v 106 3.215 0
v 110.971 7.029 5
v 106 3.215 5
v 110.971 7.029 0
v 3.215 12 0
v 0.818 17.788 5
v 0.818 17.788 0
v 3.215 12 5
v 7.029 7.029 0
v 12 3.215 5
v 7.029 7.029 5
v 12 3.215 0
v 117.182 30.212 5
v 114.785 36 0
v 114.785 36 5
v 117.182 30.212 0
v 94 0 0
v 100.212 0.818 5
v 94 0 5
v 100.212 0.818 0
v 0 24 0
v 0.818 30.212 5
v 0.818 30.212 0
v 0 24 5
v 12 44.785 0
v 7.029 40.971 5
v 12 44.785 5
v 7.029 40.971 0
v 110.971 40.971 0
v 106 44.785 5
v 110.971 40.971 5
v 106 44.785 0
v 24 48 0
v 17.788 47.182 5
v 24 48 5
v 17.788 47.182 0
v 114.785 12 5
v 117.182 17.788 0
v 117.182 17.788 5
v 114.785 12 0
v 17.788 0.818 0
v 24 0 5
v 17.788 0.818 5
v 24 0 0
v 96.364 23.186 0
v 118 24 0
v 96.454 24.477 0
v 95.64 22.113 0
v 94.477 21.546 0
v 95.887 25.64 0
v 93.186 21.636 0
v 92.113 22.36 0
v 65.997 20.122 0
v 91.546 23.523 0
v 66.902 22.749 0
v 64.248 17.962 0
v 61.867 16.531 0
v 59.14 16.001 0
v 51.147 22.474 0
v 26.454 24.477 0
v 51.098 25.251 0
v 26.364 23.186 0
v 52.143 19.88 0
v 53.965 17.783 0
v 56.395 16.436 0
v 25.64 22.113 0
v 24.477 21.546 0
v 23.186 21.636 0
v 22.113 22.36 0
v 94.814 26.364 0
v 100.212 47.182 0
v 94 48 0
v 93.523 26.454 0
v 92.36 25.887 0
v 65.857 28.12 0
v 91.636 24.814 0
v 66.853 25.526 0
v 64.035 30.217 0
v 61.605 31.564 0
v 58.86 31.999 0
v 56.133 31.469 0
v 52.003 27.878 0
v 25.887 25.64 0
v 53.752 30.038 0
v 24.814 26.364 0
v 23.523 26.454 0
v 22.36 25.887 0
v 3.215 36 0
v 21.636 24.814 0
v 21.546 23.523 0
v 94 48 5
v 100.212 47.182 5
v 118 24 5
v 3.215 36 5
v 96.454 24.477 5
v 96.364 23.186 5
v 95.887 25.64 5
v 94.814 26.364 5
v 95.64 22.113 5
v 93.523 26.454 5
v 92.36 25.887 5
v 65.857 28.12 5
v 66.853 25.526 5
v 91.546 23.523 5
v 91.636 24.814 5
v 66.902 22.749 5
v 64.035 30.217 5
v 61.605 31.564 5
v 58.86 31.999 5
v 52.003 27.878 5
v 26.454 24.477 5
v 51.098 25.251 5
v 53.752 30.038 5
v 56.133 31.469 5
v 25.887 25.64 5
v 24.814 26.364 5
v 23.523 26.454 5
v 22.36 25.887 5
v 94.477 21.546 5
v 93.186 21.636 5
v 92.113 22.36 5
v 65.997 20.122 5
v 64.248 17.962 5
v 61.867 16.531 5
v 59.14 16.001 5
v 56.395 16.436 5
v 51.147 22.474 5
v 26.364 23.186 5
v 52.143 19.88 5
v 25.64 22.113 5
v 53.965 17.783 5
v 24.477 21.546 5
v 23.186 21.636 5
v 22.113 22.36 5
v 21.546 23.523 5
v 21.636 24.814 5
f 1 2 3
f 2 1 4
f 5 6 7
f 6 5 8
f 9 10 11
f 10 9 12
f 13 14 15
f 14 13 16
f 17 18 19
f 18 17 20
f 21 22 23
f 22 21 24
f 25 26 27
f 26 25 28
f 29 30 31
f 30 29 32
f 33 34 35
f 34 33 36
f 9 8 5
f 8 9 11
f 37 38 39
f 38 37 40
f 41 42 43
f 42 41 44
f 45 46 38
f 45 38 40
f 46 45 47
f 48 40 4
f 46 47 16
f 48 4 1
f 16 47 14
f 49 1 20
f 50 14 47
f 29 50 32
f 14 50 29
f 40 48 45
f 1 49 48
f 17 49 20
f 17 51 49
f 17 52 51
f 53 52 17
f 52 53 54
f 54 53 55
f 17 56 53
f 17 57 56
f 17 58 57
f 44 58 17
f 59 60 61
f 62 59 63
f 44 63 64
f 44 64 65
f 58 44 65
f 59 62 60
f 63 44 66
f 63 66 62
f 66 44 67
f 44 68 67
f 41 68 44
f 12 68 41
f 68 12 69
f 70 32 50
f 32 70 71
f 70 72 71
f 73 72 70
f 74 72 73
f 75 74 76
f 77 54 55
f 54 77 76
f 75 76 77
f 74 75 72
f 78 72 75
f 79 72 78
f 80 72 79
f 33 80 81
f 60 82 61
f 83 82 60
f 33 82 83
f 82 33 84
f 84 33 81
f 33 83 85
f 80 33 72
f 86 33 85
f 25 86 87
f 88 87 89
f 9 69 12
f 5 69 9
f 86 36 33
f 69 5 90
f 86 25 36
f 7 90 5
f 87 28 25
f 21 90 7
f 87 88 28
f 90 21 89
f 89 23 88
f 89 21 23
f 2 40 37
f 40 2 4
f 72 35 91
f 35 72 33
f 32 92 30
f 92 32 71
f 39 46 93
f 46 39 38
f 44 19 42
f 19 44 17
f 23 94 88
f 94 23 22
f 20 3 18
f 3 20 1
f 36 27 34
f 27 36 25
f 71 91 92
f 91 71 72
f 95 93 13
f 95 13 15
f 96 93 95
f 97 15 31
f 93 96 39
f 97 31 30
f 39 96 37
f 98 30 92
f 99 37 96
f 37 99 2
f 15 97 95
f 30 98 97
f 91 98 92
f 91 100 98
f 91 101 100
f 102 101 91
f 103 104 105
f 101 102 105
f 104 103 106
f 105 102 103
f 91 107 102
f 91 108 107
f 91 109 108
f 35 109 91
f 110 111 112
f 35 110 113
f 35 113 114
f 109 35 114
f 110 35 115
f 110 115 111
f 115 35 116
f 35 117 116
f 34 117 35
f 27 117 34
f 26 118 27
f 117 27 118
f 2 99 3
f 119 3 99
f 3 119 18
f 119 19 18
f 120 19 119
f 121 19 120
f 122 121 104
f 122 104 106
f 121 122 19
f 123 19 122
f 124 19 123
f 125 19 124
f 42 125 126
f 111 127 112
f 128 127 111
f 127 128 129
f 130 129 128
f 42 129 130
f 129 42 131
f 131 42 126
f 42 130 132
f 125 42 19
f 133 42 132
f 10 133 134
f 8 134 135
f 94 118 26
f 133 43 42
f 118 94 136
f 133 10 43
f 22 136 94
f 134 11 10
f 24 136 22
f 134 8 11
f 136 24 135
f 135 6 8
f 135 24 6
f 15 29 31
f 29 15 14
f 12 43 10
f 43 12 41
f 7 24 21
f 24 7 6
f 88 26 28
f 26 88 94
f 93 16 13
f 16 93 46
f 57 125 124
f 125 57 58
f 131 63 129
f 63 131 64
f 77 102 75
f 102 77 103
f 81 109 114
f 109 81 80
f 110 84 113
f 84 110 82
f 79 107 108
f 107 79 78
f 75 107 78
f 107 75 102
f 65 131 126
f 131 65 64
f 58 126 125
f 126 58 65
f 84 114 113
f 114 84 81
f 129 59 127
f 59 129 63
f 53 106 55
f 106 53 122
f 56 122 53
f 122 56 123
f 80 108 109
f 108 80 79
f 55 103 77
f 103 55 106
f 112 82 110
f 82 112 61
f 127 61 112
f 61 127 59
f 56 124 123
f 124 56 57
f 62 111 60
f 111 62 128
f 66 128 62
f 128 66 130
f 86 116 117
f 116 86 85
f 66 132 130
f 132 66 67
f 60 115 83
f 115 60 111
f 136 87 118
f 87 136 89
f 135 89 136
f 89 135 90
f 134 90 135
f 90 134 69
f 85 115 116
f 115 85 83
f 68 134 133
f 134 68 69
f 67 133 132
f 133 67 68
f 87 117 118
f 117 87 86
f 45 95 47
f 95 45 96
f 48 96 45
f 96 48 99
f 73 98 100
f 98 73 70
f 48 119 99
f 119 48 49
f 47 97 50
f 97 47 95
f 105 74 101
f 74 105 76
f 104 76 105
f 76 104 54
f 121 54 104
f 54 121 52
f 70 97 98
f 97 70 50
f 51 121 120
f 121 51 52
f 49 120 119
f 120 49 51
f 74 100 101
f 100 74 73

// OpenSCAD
$fn = 32;

// ----------------------------------------------------------------------
// Spacer plate: obround span 70, caps R24
// ----------------------------------------------------------------------

// --- parameters (mm) ---
bore_r = 8;               // centre bore radius
bolt_r = 2.5;             // bolt hole radius
plate_t = 5;              // plate thickness, Z (extrusion height)
span = 70;                // obround span
cap_r = 24;               // cap radius

profile = [[24, 48], [17.788, 47.182], [12, 44.785], [7.029, 40.971], [3.215, 36], [0.818, 30.212], [0, 24], [0.818, 17.788], [3.215, 12], [7.029, 7.029], [12, 3.215], [17.788, 0.818], [24, 0], [94, 0], [100.212, 0.818], [106, 3.215], [110.971, 7.029], [114.785, 12], [117.182, 17.788], [118, 24], [117.182, 30.212], [114.785, 36], [110.971, 40.971], [106, 44.785], [100.212, 47.182], [94, 48]];  // primary outline, 26 points, counter clockwise
void_1 = [[66.853, 25.526], [65.857, 28.12], [64.035, 30.217], [61.605, 31.564], [58.86, 31.999], [56.133, 31.469], [53.752, 30.038], [52.003, 27.878], [51.098, 25.251], [51.147, 22.474], [52.143, 19.88], [53.965, 17.783], [56.395, 16.436], [59.14, 16.001], [61.867, 16.531], [64.248, 17.962], [65.997, 20.122], [66.902, 22.749]];  // centre bore, 18 points
void_2 = [[26.454, 24.477], [25.887, 25.64], [24.814, 26.364], [23.523, 26.454], [22.36, 25.887], [21.636, 24.814], [21.546, 23.523], [22.113, 22.36], [23.186, 21.636], [24.477, 21.546], [25.64, 22.113], [26.364, 23.186]];  // end hole, 12 points
void_3 = [[96.454, 24.477], [95.887, 25.64], [94.814, 26.364], [93.523, 26.454], [92.36, 25.887], [91.636, 24.814], [91.546, 23.523], [92.113, 22.36], [93.186, 21.636], [94.477, 21.546], [95.64, 22.113], [96.364, 23.186]];  // end hole, 12 points

// --- the one profile operation ---
difference() {
  linear_extrude(height = plate_t) polygon(points = profile);
  translate([0, 0, -1])
    linear_extrude(height = plate_t + 2) polygon(points = void_1);
  translate([0, 0, -1])
    linear_extrude(height = plate_t + 2) polygon(points = void_2);
  translate([0, 0, -1])
    linear_extrude(height = plate_t + 2) polygon(points = void_3);
}
